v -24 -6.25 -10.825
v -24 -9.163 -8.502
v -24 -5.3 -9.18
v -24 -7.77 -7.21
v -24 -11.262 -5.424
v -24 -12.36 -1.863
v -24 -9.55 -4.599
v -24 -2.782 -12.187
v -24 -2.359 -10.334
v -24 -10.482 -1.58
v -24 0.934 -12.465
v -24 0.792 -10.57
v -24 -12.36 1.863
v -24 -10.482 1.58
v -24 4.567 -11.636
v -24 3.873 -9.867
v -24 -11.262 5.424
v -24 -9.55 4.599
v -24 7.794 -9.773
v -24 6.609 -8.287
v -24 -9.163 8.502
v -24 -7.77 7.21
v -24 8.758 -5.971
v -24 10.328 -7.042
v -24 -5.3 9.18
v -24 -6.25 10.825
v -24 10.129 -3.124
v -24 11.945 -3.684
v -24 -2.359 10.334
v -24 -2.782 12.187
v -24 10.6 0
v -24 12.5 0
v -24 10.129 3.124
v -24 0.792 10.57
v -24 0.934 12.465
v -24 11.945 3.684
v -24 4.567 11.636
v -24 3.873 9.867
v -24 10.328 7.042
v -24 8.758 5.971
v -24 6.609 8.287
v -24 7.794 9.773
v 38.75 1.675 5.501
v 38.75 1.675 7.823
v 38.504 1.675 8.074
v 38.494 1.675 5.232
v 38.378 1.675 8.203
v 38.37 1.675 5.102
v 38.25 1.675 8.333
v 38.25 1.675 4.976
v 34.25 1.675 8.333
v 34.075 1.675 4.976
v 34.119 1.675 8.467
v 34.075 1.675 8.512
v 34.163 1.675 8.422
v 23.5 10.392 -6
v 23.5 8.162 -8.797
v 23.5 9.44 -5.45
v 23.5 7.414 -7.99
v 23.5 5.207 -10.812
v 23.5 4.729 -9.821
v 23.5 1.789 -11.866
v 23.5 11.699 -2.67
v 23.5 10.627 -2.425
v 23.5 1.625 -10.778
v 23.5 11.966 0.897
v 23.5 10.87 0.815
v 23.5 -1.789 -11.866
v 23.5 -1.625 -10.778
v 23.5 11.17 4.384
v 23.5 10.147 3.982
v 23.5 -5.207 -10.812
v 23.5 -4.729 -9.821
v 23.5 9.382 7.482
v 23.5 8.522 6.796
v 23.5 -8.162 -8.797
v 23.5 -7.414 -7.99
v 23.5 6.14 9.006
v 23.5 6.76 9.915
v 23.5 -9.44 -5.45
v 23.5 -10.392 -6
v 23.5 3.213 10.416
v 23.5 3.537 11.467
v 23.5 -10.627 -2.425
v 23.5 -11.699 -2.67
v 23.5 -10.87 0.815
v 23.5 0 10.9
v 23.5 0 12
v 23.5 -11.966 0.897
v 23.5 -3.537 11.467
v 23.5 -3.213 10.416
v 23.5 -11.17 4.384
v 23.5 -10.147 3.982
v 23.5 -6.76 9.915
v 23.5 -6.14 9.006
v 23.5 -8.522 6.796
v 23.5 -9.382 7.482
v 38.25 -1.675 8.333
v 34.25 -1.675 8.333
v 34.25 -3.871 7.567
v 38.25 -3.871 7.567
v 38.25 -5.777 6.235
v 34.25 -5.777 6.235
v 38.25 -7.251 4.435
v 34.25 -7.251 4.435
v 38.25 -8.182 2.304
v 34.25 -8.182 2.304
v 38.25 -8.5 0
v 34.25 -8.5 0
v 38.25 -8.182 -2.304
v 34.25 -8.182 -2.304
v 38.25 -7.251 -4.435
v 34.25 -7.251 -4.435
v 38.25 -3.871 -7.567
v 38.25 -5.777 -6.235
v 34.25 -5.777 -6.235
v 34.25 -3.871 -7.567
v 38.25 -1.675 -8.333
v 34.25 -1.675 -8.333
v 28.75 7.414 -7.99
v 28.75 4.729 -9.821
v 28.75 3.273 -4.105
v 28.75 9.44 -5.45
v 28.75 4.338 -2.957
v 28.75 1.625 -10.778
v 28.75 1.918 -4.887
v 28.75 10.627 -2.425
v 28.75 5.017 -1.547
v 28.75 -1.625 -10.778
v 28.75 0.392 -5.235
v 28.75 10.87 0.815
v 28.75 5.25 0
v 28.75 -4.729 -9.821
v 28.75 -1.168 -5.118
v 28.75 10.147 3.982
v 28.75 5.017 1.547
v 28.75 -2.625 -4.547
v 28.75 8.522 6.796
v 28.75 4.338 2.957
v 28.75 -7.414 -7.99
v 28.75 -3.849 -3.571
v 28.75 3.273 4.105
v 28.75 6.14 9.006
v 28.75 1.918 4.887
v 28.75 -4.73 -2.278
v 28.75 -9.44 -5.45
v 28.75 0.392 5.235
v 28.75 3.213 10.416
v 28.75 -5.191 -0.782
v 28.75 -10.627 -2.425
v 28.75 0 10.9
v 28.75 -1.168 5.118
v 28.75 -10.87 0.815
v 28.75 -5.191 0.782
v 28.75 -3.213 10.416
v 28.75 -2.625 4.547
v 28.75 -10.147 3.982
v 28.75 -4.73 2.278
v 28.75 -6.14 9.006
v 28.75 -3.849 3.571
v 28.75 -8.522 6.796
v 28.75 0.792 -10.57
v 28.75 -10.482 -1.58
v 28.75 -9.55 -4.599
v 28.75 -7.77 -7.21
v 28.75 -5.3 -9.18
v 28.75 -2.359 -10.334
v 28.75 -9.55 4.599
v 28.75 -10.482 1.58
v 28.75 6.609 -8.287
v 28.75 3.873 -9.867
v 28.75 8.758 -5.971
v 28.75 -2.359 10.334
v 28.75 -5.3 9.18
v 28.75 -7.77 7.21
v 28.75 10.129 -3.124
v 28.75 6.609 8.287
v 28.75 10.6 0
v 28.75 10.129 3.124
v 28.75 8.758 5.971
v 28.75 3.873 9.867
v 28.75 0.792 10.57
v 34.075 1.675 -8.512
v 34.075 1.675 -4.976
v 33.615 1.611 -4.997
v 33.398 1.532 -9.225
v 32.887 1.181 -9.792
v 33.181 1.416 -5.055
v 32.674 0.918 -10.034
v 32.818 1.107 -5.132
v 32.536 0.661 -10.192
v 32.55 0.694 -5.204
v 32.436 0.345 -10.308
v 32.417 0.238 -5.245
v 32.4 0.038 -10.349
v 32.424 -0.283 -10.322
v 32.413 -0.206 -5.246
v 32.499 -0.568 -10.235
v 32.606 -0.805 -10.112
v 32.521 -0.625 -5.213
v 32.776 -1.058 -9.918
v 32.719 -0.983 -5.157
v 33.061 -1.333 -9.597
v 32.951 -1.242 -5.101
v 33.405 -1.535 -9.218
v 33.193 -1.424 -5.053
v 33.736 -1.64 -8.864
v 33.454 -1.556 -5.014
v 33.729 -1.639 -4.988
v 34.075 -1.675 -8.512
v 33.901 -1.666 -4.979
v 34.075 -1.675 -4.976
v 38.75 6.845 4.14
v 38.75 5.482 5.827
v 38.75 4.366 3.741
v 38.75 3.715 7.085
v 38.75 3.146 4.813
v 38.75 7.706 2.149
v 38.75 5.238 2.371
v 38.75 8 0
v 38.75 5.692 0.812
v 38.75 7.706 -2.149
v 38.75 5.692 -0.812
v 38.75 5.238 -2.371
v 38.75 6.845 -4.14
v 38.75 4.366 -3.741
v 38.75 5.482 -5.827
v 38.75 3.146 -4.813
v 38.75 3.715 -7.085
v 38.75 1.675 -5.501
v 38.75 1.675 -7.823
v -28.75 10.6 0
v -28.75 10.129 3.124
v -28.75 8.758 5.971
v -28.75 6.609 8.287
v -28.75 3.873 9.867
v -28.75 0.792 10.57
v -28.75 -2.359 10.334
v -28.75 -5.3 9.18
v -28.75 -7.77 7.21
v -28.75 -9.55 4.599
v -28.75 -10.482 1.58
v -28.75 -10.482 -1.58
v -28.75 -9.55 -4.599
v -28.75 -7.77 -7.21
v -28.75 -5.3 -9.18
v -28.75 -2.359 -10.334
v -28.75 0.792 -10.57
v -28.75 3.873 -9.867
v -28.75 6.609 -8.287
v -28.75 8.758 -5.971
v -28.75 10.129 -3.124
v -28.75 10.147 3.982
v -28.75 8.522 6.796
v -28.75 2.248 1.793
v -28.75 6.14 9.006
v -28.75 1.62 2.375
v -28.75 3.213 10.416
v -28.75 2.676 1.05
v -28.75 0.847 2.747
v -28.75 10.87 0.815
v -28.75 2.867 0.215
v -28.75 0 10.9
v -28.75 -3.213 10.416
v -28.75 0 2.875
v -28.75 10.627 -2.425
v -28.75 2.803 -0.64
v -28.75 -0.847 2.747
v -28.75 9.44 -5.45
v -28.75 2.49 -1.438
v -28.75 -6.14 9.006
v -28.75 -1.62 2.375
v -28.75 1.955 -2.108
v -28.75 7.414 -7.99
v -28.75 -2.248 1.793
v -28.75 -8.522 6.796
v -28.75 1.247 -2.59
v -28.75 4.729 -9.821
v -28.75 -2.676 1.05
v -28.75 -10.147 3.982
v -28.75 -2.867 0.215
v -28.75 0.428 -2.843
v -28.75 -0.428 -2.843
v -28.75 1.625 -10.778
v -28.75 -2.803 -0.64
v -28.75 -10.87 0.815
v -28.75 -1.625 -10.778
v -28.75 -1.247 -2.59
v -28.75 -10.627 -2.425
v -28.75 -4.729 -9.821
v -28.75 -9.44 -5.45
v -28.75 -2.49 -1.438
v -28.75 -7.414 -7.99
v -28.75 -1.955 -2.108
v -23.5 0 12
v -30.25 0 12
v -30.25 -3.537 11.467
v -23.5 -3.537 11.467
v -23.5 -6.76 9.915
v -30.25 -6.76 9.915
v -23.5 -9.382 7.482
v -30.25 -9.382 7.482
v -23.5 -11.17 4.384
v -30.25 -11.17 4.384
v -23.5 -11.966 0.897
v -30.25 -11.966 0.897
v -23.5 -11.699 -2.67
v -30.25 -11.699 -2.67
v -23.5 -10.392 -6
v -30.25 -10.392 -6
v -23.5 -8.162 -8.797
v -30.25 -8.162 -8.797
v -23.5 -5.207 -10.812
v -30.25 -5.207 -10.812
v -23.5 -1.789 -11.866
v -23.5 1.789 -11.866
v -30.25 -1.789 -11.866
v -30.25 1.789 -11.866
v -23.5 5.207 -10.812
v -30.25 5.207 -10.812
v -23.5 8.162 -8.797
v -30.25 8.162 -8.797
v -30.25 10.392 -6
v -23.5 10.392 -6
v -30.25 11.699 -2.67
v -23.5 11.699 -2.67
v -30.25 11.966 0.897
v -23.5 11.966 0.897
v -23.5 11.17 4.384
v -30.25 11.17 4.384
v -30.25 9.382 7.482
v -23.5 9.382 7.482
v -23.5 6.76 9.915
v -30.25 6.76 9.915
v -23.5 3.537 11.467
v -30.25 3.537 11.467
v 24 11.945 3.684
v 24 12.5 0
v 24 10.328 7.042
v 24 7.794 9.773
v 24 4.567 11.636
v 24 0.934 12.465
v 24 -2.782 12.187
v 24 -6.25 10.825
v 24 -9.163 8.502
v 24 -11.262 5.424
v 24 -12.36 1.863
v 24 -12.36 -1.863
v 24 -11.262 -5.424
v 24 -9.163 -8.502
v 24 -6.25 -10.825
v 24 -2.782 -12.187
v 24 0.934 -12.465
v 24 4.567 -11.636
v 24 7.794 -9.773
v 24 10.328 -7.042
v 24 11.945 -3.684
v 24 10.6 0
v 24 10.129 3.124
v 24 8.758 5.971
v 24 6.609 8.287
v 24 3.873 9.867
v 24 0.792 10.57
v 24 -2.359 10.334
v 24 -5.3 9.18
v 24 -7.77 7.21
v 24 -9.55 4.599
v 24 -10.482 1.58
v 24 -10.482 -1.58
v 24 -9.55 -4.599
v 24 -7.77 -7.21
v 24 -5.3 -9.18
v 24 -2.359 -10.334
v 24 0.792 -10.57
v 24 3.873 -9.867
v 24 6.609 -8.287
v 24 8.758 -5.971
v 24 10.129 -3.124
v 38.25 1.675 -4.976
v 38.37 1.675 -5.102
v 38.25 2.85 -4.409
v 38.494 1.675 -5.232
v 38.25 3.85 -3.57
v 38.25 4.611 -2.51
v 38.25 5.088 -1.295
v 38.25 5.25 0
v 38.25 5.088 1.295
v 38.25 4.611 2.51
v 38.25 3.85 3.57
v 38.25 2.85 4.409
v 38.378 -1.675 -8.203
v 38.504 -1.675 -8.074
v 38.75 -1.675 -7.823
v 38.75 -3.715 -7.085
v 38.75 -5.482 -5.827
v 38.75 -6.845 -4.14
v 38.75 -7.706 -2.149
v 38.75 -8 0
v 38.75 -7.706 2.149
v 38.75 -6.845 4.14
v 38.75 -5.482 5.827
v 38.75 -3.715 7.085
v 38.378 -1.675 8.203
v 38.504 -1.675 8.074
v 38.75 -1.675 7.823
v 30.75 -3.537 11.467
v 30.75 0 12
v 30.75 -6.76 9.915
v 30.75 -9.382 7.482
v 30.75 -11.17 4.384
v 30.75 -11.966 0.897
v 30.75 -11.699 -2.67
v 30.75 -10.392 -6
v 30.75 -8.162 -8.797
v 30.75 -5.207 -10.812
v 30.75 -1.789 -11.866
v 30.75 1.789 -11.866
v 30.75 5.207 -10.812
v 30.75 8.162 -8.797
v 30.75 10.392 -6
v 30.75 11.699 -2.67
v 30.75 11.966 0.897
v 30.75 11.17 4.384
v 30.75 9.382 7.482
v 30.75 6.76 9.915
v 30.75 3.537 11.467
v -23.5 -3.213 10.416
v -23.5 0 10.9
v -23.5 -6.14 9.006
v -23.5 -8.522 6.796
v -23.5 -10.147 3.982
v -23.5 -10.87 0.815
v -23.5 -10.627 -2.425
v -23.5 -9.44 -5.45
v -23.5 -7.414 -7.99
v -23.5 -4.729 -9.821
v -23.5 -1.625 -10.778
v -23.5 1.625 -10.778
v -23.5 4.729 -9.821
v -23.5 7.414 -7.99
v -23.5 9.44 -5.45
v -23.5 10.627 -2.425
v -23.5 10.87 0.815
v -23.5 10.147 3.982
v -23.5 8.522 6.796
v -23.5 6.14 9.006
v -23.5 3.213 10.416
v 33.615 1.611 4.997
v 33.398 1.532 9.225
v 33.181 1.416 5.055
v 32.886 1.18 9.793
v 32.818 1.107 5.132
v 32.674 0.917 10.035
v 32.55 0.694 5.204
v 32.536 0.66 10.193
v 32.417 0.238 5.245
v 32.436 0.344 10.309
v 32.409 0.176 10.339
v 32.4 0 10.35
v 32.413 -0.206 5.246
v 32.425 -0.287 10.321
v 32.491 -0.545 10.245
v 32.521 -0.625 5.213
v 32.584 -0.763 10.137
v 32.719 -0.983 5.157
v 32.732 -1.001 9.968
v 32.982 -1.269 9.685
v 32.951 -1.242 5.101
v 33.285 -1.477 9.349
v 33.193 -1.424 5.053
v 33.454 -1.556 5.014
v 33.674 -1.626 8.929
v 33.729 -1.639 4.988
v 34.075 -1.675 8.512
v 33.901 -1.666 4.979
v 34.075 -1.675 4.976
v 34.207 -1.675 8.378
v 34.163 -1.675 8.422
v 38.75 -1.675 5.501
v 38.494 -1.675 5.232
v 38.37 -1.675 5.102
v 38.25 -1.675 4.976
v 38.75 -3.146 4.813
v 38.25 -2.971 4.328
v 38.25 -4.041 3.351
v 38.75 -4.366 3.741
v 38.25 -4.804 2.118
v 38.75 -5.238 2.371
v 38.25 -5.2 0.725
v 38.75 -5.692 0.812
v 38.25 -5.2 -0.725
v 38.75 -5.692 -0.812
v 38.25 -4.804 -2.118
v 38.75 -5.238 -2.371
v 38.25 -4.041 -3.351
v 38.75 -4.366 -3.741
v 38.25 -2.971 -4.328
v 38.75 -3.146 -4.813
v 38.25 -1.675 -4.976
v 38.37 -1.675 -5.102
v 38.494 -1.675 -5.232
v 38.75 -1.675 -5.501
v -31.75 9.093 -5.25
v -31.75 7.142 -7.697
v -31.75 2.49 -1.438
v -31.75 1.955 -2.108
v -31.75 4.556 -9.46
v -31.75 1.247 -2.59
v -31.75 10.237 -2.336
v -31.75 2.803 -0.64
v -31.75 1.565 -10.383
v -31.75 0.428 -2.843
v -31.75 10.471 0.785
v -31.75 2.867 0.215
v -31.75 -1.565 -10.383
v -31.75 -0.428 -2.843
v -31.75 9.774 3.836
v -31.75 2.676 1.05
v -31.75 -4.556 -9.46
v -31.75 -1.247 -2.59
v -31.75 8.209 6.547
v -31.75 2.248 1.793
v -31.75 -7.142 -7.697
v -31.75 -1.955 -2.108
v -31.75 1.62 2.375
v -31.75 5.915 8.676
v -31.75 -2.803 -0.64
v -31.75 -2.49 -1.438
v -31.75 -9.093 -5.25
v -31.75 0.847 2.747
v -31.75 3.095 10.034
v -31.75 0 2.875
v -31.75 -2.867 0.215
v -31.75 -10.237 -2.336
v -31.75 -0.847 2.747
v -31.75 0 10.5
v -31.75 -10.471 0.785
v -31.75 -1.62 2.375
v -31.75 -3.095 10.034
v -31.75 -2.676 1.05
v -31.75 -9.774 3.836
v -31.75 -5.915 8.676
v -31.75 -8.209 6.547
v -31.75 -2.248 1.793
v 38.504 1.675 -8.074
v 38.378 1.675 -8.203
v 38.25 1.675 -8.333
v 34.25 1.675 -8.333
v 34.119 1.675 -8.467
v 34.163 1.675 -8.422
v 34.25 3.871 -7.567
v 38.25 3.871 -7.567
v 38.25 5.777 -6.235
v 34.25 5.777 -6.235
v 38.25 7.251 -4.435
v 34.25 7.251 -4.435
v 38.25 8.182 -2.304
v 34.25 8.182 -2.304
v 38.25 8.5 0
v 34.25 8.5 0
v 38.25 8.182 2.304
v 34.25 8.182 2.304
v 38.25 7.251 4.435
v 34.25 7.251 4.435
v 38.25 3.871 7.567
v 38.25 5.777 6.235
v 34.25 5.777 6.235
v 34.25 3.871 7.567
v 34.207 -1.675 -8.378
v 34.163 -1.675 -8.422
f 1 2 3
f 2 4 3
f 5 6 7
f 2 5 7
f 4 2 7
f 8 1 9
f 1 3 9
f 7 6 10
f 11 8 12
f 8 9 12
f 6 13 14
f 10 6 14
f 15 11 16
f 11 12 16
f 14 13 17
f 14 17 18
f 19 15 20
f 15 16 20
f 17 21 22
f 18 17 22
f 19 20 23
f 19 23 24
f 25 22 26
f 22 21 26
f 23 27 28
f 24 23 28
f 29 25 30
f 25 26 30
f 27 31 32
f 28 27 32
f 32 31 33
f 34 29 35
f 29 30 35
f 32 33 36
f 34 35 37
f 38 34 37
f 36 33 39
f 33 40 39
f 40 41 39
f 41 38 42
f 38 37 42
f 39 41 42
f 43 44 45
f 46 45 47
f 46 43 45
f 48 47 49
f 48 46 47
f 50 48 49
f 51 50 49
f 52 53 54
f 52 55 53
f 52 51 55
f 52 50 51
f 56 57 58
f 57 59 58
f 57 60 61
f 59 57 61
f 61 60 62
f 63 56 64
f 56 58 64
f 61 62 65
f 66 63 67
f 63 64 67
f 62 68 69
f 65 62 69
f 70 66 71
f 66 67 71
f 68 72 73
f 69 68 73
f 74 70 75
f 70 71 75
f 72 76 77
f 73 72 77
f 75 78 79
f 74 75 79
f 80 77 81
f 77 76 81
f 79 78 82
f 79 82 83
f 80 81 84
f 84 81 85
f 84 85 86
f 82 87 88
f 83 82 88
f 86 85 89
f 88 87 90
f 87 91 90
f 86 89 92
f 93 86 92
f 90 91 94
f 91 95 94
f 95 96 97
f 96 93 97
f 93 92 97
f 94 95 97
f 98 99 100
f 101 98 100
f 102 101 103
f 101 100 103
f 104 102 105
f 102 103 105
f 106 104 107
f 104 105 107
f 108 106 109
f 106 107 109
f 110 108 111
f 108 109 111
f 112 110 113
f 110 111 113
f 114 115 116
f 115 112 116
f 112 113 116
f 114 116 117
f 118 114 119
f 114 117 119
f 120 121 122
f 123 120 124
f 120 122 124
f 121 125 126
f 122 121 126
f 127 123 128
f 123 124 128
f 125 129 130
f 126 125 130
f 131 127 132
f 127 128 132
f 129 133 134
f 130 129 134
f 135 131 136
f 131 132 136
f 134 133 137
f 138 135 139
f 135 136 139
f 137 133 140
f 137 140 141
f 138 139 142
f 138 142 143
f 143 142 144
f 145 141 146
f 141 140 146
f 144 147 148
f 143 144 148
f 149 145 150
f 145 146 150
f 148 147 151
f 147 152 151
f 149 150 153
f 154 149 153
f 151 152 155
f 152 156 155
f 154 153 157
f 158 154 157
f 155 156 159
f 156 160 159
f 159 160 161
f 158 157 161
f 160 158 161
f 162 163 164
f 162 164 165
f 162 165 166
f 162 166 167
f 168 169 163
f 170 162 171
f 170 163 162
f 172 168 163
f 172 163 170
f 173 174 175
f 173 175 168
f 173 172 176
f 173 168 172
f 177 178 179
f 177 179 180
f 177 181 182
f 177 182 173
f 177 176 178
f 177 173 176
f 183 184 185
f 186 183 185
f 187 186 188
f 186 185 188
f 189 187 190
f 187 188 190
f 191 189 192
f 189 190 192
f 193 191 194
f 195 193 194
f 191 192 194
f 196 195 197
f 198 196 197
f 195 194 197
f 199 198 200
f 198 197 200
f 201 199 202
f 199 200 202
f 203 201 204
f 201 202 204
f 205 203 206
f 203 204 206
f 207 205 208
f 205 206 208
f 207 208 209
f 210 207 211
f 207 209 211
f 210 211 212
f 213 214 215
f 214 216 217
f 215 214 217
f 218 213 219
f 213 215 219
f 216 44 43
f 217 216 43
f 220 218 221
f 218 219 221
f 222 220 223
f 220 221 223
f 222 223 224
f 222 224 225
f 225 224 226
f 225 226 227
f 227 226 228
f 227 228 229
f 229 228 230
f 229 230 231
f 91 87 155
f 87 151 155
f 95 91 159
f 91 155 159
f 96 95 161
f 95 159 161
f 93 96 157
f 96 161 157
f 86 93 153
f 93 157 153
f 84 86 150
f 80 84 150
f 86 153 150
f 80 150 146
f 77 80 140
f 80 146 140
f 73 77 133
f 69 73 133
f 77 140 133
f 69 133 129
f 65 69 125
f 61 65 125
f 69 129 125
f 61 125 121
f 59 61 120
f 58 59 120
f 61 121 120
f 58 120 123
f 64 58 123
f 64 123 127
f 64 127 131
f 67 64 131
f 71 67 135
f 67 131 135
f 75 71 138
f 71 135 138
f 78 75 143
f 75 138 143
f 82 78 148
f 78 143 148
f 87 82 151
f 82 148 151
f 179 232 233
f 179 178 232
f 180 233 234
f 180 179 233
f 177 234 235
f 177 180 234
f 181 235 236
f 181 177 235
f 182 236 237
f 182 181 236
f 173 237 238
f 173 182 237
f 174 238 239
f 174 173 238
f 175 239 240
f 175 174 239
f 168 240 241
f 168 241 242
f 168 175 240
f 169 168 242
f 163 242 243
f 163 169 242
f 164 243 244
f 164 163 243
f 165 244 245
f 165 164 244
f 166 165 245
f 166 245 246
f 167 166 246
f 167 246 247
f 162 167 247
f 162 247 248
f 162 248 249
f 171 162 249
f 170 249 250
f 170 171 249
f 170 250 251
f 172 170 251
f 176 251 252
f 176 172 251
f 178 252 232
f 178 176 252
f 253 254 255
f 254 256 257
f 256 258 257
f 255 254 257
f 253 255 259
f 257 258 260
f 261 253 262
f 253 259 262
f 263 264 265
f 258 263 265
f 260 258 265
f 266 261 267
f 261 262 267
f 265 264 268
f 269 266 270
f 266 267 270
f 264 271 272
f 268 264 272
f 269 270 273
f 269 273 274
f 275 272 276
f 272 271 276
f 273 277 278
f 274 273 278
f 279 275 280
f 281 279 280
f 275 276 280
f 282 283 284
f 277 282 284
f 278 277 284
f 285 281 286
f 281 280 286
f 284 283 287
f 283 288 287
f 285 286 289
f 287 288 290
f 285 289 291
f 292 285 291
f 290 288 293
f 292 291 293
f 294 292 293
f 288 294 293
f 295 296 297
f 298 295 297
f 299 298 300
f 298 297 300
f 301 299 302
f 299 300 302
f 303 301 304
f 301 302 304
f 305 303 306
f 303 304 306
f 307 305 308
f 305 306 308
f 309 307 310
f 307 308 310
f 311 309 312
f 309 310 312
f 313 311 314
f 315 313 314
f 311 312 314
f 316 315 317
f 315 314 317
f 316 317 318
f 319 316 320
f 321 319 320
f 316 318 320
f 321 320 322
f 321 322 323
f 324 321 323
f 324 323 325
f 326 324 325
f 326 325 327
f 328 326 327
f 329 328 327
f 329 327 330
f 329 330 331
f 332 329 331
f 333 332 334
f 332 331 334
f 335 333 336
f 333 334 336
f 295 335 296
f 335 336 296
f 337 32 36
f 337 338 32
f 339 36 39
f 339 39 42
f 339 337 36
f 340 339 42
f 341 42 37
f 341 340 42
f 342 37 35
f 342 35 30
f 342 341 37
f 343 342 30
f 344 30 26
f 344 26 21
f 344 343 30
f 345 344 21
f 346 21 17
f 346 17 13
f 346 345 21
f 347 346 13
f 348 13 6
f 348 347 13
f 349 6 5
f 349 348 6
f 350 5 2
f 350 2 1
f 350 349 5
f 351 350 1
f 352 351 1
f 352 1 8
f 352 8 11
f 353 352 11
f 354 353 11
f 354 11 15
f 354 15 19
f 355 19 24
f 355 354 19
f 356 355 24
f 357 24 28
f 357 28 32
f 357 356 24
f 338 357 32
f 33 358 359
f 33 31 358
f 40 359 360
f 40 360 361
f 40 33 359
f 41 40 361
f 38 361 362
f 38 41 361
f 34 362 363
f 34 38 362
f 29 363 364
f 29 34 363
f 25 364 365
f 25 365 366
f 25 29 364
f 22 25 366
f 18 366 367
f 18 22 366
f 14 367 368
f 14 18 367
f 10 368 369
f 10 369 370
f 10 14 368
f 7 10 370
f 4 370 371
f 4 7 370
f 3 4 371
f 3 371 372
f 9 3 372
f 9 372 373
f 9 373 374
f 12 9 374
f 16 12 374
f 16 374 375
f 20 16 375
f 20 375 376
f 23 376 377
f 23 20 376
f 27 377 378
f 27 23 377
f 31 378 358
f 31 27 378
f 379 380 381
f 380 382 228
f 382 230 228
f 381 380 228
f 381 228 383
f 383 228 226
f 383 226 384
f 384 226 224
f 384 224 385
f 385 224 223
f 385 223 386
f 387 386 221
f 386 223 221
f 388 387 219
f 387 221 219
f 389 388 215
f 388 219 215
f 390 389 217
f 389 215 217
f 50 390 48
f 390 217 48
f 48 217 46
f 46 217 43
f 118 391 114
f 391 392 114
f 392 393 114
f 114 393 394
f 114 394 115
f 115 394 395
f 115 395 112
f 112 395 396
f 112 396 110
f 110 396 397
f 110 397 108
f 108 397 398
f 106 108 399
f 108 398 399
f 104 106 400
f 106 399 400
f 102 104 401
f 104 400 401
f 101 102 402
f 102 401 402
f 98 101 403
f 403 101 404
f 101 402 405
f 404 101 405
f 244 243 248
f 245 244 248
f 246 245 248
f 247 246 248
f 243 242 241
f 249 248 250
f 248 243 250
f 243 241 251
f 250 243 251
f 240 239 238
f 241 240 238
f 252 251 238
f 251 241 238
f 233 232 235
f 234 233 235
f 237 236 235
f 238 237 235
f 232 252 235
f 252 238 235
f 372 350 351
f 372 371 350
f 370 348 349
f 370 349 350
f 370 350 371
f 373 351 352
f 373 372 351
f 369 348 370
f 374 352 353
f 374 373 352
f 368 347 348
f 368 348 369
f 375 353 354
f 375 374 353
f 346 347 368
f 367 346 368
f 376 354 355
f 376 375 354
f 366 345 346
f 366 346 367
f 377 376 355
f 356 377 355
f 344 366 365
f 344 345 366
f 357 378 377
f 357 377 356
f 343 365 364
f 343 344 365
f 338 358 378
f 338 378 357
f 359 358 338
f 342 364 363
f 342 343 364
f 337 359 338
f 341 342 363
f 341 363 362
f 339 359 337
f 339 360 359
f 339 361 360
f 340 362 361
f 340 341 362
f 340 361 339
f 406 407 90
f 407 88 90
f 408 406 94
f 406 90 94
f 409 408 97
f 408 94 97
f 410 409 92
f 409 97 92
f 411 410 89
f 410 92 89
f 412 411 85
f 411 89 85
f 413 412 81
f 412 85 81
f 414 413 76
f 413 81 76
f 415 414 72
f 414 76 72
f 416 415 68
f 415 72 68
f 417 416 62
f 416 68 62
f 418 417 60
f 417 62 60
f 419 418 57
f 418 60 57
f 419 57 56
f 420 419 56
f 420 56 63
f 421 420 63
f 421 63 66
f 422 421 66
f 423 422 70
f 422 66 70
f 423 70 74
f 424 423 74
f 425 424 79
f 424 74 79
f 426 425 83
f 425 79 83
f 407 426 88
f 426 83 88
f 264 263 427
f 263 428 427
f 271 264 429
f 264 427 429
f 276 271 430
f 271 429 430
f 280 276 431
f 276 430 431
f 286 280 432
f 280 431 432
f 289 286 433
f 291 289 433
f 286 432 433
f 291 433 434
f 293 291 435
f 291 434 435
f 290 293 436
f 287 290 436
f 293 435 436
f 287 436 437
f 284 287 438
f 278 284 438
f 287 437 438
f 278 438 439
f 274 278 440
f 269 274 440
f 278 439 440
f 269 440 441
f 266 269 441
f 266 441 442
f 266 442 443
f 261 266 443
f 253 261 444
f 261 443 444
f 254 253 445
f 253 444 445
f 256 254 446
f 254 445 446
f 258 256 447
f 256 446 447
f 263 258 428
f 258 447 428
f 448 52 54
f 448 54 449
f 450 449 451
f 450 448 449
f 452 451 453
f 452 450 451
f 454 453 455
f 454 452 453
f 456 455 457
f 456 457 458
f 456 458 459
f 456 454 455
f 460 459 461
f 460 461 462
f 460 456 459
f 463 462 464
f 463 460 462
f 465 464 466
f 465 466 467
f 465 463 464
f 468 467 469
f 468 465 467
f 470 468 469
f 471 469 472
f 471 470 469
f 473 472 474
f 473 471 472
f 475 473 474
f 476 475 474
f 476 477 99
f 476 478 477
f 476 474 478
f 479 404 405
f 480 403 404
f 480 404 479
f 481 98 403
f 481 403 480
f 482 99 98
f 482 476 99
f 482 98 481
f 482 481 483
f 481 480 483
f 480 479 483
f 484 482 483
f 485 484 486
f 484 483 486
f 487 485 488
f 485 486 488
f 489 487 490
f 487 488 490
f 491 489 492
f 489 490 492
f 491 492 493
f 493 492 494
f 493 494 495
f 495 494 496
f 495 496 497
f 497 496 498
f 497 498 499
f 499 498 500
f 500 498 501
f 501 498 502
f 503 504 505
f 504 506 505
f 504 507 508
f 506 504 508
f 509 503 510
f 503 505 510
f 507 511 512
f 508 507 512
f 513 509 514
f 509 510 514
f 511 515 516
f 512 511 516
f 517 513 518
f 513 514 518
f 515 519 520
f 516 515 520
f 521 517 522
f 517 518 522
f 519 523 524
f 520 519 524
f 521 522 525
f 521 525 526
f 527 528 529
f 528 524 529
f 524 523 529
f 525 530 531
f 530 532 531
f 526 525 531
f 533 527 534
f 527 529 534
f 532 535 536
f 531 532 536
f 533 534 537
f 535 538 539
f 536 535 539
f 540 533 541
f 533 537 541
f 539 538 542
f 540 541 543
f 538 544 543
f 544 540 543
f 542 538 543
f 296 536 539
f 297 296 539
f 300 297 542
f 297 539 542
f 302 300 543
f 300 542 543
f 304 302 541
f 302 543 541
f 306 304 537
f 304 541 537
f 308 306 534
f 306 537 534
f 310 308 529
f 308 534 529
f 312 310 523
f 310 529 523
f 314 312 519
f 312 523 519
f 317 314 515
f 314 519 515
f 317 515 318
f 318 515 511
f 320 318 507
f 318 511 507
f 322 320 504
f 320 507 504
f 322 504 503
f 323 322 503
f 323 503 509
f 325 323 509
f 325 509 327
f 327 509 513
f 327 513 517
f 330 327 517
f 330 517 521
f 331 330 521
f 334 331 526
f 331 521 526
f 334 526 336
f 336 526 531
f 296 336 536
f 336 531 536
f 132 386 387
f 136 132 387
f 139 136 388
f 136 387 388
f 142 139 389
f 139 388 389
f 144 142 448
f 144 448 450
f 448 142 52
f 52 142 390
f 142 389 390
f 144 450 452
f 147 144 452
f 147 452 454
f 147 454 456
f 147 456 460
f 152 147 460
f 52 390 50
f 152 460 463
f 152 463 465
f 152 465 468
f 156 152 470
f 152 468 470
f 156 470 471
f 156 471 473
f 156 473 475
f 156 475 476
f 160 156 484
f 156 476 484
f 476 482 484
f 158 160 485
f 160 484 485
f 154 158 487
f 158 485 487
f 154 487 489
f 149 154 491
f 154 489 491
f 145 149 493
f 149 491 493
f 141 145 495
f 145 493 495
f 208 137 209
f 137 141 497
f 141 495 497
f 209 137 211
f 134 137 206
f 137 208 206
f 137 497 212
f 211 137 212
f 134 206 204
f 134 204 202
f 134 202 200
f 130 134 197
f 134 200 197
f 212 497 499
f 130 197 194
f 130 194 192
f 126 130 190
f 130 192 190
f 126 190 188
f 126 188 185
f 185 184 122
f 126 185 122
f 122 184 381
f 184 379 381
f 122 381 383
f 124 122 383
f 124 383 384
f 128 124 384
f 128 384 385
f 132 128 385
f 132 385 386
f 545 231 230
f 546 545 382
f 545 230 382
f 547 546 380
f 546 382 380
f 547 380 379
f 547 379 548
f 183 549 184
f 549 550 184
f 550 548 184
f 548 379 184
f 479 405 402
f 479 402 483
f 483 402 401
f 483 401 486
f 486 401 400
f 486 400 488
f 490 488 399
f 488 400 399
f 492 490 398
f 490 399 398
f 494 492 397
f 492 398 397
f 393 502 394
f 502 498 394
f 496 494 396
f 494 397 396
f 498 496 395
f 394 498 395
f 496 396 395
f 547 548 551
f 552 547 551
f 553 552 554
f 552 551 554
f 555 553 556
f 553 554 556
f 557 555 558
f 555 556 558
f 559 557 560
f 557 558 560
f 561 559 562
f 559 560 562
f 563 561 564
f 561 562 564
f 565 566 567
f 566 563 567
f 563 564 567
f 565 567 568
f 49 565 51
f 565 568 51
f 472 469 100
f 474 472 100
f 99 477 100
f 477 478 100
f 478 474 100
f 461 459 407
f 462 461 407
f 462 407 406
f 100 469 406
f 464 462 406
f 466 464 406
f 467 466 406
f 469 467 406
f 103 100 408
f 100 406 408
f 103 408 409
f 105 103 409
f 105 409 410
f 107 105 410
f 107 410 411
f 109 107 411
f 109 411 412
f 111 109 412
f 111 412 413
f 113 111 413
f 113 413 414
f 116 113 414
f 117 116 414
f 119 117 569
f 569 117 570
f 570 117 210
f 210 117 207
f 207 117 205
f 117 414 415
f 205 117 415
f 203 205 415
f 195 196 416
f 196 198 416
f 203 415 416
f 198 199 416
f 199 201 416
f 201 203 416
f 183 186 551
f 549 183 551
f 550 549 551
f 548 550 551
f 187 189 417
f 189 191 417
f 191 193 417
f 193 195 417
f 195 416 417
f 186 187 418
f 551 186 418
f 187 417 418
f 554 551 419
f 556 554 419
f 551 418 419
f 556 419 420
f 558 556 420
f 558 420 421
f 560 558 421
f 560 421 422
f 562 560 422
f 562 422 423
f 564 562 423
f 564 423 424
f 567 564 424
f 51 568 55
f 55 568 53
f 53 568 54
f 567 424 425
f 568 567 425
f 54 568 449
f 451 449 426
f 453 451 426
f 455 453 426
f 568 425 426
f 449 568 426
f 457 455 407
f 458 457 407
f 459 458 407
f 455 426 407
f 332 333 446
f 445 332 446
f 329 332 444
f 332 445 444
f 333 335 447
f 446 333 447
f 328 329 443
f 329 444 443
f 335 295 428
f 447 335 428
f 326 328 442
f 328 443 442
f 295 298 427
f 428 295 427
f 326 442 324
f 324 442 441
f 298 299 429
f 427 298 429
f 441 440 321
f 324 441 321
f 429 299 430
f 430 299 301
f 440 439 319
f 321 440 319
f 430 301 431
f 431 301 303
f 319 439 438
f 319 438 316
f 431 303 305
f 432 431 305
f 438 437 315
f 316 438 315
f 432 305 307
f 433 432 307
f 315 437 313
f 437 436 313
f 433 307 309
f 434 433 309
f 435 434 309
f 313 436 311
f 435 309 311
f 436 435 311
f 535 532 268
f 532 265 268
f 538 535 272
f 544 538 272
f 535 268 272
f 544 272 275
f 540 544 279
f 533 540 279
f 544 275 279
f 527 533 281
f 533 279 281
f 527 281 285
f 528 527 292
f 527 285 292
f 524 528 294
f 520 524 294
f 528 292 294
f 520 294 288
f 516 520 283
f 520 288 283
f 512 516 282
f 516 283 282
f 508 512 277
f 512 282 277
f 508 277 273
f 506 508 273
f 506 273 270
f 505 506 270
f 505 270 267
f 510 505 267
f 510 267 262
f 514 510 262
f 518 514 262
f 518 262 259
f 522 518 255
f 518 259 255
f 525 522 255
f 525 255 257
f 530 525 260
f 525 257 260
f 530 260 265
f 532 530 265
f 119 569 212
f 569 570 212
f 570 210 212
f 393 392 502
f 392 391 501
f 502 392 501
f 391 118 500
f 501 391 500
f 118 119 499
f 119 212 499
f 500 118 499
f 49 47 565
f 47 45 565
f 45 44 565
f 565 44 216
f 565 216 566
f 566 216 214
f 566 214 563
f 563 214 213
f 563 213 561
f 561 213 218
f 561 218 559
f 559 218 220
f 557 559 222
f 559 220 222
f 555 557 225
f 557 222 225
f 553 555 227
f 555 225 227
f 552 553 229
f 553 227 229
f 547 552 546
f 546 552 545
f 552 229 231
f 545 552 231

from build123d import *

# Parameters (mm, degrees)
F0_R           = 10.6
F1_DEPTH       = 28.75
F2_R           = 12.5
F2_R_2         = 10.6
F3_DEPTH       = 24
F6_SIZE        = 1.5
F7_R           = 4
F8_DEPTH       = 1
F9_R           = 5.25
F10_DEPTH      = 25
F12_DEPTH      = 12.501
F12_DEPTH_BACK = 12.501
F13_SIZE       = 0.5


with BuildPart() as f1:
    # F0 (on Right) → F1 (new body, symmetric)
    with BuildSketch(Plane.YZ):
        Circle(F0_R)
    extrude(amount=F1_DEPTH, both=True)


with BuildPart() as f3:
    # F2 (on Right) → F3 (new body, symmetric)
    with BuildSketch(Plane.YZ):
        Circle(F2_R)
        Circle(F2_R_2, mode=Mode.SUBTRACT)
    extrude(amount=F3_DEPTH, both=True)


with BuildPart() as f5:
    # F4 (on Front) → F5 (revolve)
    with BuildSketch(Plane.XZ):
        Polygon((30.75, 12), (23.5, 12), (23.5, 10.9), (28.75, 10.9), (28.75, 0), (38.75, 0), (38.75, 8.5), (34.25, 8.5), align=None)
    revolve(axis=Axis((0, 0, 0), (1, 0, 0)))

    # F9 (on face) → F10 (cut)
    with BuildSketch(Plane.YZ.offset(38.75)):
        Circle(F9_R)
    extrude(amount=-F10_DEPTH, mode=Mode.SUBTRACT)

    # F11 (on Top) → F12 (cut, two sides)
    with BuildSketch(Plane.XY) as f12_sk:
        with BuildLine():
            Line((38.75, 1.675), (34.075, 1.675))
            ThreePointArc((34.075, 1.675), (32.4, 0), (34.075, -1.675))
            Line((34.075, -1.675), (38.75, -1.675))
            Line((38.75, -1.675), (38.75, 1.675))
        make_face()
    extrude(amount=-F12_DEPTH, mode=Mode.SUBTRACT)
    extrude(f12_sk.sketch, amount=F12_DEPTH_BACK, mode=Mode.SUBTRACT)

    # F13
    f13_edges = [f5.edges().sort_by_distance(p)[0] for p in [
        (38.75, 8.5, 0),
        (38.75, -8.5, 0),
        (38.75, -5.25, 0),
        (38.75, 4.263581, 3.063393),
        (38.75, 4.263581, -3.063393),
    ]]
    chamfer(f13_edges, length=F13_SIZE)


with BuildPart() as f5b:
    # F4 (on Front) → F5, piece 2 (revolve)
    with BuildSketch(Plane.XZ):
        Polygon((-23.5, 10.9), (-23.5, 12), (-31.75, 12), (-31.75, 4), (-32.75, 4), (-32.75, 2.875), (-28.75, 2.875), (-28.75, 10.9), align=None)
    revolve(axis=Axis((0, 0, 0), (1, 0, 0)))

    # F6
    f6_edges = [f5b.edges().sort_by_distance(p)[0] for p in [
        (-31.75, 0, -12),
    ]]
    chamfer(f6_edges, length=F6_SIZE)

    # F7 (on face) → F8 (cut, through all)
    with BuildSketch(Plane(origin=(-32.75, 0, 0), x_dir=(0, -1, 0), z_dir=(-1, 0, 0))):
        Circle(F7_R)
    extrude(amount=-F8_DEPTH, mode=Mode.SUBTRACT)


solid = Compound([f1.part, f3.part, f5.part, f5b.part])
